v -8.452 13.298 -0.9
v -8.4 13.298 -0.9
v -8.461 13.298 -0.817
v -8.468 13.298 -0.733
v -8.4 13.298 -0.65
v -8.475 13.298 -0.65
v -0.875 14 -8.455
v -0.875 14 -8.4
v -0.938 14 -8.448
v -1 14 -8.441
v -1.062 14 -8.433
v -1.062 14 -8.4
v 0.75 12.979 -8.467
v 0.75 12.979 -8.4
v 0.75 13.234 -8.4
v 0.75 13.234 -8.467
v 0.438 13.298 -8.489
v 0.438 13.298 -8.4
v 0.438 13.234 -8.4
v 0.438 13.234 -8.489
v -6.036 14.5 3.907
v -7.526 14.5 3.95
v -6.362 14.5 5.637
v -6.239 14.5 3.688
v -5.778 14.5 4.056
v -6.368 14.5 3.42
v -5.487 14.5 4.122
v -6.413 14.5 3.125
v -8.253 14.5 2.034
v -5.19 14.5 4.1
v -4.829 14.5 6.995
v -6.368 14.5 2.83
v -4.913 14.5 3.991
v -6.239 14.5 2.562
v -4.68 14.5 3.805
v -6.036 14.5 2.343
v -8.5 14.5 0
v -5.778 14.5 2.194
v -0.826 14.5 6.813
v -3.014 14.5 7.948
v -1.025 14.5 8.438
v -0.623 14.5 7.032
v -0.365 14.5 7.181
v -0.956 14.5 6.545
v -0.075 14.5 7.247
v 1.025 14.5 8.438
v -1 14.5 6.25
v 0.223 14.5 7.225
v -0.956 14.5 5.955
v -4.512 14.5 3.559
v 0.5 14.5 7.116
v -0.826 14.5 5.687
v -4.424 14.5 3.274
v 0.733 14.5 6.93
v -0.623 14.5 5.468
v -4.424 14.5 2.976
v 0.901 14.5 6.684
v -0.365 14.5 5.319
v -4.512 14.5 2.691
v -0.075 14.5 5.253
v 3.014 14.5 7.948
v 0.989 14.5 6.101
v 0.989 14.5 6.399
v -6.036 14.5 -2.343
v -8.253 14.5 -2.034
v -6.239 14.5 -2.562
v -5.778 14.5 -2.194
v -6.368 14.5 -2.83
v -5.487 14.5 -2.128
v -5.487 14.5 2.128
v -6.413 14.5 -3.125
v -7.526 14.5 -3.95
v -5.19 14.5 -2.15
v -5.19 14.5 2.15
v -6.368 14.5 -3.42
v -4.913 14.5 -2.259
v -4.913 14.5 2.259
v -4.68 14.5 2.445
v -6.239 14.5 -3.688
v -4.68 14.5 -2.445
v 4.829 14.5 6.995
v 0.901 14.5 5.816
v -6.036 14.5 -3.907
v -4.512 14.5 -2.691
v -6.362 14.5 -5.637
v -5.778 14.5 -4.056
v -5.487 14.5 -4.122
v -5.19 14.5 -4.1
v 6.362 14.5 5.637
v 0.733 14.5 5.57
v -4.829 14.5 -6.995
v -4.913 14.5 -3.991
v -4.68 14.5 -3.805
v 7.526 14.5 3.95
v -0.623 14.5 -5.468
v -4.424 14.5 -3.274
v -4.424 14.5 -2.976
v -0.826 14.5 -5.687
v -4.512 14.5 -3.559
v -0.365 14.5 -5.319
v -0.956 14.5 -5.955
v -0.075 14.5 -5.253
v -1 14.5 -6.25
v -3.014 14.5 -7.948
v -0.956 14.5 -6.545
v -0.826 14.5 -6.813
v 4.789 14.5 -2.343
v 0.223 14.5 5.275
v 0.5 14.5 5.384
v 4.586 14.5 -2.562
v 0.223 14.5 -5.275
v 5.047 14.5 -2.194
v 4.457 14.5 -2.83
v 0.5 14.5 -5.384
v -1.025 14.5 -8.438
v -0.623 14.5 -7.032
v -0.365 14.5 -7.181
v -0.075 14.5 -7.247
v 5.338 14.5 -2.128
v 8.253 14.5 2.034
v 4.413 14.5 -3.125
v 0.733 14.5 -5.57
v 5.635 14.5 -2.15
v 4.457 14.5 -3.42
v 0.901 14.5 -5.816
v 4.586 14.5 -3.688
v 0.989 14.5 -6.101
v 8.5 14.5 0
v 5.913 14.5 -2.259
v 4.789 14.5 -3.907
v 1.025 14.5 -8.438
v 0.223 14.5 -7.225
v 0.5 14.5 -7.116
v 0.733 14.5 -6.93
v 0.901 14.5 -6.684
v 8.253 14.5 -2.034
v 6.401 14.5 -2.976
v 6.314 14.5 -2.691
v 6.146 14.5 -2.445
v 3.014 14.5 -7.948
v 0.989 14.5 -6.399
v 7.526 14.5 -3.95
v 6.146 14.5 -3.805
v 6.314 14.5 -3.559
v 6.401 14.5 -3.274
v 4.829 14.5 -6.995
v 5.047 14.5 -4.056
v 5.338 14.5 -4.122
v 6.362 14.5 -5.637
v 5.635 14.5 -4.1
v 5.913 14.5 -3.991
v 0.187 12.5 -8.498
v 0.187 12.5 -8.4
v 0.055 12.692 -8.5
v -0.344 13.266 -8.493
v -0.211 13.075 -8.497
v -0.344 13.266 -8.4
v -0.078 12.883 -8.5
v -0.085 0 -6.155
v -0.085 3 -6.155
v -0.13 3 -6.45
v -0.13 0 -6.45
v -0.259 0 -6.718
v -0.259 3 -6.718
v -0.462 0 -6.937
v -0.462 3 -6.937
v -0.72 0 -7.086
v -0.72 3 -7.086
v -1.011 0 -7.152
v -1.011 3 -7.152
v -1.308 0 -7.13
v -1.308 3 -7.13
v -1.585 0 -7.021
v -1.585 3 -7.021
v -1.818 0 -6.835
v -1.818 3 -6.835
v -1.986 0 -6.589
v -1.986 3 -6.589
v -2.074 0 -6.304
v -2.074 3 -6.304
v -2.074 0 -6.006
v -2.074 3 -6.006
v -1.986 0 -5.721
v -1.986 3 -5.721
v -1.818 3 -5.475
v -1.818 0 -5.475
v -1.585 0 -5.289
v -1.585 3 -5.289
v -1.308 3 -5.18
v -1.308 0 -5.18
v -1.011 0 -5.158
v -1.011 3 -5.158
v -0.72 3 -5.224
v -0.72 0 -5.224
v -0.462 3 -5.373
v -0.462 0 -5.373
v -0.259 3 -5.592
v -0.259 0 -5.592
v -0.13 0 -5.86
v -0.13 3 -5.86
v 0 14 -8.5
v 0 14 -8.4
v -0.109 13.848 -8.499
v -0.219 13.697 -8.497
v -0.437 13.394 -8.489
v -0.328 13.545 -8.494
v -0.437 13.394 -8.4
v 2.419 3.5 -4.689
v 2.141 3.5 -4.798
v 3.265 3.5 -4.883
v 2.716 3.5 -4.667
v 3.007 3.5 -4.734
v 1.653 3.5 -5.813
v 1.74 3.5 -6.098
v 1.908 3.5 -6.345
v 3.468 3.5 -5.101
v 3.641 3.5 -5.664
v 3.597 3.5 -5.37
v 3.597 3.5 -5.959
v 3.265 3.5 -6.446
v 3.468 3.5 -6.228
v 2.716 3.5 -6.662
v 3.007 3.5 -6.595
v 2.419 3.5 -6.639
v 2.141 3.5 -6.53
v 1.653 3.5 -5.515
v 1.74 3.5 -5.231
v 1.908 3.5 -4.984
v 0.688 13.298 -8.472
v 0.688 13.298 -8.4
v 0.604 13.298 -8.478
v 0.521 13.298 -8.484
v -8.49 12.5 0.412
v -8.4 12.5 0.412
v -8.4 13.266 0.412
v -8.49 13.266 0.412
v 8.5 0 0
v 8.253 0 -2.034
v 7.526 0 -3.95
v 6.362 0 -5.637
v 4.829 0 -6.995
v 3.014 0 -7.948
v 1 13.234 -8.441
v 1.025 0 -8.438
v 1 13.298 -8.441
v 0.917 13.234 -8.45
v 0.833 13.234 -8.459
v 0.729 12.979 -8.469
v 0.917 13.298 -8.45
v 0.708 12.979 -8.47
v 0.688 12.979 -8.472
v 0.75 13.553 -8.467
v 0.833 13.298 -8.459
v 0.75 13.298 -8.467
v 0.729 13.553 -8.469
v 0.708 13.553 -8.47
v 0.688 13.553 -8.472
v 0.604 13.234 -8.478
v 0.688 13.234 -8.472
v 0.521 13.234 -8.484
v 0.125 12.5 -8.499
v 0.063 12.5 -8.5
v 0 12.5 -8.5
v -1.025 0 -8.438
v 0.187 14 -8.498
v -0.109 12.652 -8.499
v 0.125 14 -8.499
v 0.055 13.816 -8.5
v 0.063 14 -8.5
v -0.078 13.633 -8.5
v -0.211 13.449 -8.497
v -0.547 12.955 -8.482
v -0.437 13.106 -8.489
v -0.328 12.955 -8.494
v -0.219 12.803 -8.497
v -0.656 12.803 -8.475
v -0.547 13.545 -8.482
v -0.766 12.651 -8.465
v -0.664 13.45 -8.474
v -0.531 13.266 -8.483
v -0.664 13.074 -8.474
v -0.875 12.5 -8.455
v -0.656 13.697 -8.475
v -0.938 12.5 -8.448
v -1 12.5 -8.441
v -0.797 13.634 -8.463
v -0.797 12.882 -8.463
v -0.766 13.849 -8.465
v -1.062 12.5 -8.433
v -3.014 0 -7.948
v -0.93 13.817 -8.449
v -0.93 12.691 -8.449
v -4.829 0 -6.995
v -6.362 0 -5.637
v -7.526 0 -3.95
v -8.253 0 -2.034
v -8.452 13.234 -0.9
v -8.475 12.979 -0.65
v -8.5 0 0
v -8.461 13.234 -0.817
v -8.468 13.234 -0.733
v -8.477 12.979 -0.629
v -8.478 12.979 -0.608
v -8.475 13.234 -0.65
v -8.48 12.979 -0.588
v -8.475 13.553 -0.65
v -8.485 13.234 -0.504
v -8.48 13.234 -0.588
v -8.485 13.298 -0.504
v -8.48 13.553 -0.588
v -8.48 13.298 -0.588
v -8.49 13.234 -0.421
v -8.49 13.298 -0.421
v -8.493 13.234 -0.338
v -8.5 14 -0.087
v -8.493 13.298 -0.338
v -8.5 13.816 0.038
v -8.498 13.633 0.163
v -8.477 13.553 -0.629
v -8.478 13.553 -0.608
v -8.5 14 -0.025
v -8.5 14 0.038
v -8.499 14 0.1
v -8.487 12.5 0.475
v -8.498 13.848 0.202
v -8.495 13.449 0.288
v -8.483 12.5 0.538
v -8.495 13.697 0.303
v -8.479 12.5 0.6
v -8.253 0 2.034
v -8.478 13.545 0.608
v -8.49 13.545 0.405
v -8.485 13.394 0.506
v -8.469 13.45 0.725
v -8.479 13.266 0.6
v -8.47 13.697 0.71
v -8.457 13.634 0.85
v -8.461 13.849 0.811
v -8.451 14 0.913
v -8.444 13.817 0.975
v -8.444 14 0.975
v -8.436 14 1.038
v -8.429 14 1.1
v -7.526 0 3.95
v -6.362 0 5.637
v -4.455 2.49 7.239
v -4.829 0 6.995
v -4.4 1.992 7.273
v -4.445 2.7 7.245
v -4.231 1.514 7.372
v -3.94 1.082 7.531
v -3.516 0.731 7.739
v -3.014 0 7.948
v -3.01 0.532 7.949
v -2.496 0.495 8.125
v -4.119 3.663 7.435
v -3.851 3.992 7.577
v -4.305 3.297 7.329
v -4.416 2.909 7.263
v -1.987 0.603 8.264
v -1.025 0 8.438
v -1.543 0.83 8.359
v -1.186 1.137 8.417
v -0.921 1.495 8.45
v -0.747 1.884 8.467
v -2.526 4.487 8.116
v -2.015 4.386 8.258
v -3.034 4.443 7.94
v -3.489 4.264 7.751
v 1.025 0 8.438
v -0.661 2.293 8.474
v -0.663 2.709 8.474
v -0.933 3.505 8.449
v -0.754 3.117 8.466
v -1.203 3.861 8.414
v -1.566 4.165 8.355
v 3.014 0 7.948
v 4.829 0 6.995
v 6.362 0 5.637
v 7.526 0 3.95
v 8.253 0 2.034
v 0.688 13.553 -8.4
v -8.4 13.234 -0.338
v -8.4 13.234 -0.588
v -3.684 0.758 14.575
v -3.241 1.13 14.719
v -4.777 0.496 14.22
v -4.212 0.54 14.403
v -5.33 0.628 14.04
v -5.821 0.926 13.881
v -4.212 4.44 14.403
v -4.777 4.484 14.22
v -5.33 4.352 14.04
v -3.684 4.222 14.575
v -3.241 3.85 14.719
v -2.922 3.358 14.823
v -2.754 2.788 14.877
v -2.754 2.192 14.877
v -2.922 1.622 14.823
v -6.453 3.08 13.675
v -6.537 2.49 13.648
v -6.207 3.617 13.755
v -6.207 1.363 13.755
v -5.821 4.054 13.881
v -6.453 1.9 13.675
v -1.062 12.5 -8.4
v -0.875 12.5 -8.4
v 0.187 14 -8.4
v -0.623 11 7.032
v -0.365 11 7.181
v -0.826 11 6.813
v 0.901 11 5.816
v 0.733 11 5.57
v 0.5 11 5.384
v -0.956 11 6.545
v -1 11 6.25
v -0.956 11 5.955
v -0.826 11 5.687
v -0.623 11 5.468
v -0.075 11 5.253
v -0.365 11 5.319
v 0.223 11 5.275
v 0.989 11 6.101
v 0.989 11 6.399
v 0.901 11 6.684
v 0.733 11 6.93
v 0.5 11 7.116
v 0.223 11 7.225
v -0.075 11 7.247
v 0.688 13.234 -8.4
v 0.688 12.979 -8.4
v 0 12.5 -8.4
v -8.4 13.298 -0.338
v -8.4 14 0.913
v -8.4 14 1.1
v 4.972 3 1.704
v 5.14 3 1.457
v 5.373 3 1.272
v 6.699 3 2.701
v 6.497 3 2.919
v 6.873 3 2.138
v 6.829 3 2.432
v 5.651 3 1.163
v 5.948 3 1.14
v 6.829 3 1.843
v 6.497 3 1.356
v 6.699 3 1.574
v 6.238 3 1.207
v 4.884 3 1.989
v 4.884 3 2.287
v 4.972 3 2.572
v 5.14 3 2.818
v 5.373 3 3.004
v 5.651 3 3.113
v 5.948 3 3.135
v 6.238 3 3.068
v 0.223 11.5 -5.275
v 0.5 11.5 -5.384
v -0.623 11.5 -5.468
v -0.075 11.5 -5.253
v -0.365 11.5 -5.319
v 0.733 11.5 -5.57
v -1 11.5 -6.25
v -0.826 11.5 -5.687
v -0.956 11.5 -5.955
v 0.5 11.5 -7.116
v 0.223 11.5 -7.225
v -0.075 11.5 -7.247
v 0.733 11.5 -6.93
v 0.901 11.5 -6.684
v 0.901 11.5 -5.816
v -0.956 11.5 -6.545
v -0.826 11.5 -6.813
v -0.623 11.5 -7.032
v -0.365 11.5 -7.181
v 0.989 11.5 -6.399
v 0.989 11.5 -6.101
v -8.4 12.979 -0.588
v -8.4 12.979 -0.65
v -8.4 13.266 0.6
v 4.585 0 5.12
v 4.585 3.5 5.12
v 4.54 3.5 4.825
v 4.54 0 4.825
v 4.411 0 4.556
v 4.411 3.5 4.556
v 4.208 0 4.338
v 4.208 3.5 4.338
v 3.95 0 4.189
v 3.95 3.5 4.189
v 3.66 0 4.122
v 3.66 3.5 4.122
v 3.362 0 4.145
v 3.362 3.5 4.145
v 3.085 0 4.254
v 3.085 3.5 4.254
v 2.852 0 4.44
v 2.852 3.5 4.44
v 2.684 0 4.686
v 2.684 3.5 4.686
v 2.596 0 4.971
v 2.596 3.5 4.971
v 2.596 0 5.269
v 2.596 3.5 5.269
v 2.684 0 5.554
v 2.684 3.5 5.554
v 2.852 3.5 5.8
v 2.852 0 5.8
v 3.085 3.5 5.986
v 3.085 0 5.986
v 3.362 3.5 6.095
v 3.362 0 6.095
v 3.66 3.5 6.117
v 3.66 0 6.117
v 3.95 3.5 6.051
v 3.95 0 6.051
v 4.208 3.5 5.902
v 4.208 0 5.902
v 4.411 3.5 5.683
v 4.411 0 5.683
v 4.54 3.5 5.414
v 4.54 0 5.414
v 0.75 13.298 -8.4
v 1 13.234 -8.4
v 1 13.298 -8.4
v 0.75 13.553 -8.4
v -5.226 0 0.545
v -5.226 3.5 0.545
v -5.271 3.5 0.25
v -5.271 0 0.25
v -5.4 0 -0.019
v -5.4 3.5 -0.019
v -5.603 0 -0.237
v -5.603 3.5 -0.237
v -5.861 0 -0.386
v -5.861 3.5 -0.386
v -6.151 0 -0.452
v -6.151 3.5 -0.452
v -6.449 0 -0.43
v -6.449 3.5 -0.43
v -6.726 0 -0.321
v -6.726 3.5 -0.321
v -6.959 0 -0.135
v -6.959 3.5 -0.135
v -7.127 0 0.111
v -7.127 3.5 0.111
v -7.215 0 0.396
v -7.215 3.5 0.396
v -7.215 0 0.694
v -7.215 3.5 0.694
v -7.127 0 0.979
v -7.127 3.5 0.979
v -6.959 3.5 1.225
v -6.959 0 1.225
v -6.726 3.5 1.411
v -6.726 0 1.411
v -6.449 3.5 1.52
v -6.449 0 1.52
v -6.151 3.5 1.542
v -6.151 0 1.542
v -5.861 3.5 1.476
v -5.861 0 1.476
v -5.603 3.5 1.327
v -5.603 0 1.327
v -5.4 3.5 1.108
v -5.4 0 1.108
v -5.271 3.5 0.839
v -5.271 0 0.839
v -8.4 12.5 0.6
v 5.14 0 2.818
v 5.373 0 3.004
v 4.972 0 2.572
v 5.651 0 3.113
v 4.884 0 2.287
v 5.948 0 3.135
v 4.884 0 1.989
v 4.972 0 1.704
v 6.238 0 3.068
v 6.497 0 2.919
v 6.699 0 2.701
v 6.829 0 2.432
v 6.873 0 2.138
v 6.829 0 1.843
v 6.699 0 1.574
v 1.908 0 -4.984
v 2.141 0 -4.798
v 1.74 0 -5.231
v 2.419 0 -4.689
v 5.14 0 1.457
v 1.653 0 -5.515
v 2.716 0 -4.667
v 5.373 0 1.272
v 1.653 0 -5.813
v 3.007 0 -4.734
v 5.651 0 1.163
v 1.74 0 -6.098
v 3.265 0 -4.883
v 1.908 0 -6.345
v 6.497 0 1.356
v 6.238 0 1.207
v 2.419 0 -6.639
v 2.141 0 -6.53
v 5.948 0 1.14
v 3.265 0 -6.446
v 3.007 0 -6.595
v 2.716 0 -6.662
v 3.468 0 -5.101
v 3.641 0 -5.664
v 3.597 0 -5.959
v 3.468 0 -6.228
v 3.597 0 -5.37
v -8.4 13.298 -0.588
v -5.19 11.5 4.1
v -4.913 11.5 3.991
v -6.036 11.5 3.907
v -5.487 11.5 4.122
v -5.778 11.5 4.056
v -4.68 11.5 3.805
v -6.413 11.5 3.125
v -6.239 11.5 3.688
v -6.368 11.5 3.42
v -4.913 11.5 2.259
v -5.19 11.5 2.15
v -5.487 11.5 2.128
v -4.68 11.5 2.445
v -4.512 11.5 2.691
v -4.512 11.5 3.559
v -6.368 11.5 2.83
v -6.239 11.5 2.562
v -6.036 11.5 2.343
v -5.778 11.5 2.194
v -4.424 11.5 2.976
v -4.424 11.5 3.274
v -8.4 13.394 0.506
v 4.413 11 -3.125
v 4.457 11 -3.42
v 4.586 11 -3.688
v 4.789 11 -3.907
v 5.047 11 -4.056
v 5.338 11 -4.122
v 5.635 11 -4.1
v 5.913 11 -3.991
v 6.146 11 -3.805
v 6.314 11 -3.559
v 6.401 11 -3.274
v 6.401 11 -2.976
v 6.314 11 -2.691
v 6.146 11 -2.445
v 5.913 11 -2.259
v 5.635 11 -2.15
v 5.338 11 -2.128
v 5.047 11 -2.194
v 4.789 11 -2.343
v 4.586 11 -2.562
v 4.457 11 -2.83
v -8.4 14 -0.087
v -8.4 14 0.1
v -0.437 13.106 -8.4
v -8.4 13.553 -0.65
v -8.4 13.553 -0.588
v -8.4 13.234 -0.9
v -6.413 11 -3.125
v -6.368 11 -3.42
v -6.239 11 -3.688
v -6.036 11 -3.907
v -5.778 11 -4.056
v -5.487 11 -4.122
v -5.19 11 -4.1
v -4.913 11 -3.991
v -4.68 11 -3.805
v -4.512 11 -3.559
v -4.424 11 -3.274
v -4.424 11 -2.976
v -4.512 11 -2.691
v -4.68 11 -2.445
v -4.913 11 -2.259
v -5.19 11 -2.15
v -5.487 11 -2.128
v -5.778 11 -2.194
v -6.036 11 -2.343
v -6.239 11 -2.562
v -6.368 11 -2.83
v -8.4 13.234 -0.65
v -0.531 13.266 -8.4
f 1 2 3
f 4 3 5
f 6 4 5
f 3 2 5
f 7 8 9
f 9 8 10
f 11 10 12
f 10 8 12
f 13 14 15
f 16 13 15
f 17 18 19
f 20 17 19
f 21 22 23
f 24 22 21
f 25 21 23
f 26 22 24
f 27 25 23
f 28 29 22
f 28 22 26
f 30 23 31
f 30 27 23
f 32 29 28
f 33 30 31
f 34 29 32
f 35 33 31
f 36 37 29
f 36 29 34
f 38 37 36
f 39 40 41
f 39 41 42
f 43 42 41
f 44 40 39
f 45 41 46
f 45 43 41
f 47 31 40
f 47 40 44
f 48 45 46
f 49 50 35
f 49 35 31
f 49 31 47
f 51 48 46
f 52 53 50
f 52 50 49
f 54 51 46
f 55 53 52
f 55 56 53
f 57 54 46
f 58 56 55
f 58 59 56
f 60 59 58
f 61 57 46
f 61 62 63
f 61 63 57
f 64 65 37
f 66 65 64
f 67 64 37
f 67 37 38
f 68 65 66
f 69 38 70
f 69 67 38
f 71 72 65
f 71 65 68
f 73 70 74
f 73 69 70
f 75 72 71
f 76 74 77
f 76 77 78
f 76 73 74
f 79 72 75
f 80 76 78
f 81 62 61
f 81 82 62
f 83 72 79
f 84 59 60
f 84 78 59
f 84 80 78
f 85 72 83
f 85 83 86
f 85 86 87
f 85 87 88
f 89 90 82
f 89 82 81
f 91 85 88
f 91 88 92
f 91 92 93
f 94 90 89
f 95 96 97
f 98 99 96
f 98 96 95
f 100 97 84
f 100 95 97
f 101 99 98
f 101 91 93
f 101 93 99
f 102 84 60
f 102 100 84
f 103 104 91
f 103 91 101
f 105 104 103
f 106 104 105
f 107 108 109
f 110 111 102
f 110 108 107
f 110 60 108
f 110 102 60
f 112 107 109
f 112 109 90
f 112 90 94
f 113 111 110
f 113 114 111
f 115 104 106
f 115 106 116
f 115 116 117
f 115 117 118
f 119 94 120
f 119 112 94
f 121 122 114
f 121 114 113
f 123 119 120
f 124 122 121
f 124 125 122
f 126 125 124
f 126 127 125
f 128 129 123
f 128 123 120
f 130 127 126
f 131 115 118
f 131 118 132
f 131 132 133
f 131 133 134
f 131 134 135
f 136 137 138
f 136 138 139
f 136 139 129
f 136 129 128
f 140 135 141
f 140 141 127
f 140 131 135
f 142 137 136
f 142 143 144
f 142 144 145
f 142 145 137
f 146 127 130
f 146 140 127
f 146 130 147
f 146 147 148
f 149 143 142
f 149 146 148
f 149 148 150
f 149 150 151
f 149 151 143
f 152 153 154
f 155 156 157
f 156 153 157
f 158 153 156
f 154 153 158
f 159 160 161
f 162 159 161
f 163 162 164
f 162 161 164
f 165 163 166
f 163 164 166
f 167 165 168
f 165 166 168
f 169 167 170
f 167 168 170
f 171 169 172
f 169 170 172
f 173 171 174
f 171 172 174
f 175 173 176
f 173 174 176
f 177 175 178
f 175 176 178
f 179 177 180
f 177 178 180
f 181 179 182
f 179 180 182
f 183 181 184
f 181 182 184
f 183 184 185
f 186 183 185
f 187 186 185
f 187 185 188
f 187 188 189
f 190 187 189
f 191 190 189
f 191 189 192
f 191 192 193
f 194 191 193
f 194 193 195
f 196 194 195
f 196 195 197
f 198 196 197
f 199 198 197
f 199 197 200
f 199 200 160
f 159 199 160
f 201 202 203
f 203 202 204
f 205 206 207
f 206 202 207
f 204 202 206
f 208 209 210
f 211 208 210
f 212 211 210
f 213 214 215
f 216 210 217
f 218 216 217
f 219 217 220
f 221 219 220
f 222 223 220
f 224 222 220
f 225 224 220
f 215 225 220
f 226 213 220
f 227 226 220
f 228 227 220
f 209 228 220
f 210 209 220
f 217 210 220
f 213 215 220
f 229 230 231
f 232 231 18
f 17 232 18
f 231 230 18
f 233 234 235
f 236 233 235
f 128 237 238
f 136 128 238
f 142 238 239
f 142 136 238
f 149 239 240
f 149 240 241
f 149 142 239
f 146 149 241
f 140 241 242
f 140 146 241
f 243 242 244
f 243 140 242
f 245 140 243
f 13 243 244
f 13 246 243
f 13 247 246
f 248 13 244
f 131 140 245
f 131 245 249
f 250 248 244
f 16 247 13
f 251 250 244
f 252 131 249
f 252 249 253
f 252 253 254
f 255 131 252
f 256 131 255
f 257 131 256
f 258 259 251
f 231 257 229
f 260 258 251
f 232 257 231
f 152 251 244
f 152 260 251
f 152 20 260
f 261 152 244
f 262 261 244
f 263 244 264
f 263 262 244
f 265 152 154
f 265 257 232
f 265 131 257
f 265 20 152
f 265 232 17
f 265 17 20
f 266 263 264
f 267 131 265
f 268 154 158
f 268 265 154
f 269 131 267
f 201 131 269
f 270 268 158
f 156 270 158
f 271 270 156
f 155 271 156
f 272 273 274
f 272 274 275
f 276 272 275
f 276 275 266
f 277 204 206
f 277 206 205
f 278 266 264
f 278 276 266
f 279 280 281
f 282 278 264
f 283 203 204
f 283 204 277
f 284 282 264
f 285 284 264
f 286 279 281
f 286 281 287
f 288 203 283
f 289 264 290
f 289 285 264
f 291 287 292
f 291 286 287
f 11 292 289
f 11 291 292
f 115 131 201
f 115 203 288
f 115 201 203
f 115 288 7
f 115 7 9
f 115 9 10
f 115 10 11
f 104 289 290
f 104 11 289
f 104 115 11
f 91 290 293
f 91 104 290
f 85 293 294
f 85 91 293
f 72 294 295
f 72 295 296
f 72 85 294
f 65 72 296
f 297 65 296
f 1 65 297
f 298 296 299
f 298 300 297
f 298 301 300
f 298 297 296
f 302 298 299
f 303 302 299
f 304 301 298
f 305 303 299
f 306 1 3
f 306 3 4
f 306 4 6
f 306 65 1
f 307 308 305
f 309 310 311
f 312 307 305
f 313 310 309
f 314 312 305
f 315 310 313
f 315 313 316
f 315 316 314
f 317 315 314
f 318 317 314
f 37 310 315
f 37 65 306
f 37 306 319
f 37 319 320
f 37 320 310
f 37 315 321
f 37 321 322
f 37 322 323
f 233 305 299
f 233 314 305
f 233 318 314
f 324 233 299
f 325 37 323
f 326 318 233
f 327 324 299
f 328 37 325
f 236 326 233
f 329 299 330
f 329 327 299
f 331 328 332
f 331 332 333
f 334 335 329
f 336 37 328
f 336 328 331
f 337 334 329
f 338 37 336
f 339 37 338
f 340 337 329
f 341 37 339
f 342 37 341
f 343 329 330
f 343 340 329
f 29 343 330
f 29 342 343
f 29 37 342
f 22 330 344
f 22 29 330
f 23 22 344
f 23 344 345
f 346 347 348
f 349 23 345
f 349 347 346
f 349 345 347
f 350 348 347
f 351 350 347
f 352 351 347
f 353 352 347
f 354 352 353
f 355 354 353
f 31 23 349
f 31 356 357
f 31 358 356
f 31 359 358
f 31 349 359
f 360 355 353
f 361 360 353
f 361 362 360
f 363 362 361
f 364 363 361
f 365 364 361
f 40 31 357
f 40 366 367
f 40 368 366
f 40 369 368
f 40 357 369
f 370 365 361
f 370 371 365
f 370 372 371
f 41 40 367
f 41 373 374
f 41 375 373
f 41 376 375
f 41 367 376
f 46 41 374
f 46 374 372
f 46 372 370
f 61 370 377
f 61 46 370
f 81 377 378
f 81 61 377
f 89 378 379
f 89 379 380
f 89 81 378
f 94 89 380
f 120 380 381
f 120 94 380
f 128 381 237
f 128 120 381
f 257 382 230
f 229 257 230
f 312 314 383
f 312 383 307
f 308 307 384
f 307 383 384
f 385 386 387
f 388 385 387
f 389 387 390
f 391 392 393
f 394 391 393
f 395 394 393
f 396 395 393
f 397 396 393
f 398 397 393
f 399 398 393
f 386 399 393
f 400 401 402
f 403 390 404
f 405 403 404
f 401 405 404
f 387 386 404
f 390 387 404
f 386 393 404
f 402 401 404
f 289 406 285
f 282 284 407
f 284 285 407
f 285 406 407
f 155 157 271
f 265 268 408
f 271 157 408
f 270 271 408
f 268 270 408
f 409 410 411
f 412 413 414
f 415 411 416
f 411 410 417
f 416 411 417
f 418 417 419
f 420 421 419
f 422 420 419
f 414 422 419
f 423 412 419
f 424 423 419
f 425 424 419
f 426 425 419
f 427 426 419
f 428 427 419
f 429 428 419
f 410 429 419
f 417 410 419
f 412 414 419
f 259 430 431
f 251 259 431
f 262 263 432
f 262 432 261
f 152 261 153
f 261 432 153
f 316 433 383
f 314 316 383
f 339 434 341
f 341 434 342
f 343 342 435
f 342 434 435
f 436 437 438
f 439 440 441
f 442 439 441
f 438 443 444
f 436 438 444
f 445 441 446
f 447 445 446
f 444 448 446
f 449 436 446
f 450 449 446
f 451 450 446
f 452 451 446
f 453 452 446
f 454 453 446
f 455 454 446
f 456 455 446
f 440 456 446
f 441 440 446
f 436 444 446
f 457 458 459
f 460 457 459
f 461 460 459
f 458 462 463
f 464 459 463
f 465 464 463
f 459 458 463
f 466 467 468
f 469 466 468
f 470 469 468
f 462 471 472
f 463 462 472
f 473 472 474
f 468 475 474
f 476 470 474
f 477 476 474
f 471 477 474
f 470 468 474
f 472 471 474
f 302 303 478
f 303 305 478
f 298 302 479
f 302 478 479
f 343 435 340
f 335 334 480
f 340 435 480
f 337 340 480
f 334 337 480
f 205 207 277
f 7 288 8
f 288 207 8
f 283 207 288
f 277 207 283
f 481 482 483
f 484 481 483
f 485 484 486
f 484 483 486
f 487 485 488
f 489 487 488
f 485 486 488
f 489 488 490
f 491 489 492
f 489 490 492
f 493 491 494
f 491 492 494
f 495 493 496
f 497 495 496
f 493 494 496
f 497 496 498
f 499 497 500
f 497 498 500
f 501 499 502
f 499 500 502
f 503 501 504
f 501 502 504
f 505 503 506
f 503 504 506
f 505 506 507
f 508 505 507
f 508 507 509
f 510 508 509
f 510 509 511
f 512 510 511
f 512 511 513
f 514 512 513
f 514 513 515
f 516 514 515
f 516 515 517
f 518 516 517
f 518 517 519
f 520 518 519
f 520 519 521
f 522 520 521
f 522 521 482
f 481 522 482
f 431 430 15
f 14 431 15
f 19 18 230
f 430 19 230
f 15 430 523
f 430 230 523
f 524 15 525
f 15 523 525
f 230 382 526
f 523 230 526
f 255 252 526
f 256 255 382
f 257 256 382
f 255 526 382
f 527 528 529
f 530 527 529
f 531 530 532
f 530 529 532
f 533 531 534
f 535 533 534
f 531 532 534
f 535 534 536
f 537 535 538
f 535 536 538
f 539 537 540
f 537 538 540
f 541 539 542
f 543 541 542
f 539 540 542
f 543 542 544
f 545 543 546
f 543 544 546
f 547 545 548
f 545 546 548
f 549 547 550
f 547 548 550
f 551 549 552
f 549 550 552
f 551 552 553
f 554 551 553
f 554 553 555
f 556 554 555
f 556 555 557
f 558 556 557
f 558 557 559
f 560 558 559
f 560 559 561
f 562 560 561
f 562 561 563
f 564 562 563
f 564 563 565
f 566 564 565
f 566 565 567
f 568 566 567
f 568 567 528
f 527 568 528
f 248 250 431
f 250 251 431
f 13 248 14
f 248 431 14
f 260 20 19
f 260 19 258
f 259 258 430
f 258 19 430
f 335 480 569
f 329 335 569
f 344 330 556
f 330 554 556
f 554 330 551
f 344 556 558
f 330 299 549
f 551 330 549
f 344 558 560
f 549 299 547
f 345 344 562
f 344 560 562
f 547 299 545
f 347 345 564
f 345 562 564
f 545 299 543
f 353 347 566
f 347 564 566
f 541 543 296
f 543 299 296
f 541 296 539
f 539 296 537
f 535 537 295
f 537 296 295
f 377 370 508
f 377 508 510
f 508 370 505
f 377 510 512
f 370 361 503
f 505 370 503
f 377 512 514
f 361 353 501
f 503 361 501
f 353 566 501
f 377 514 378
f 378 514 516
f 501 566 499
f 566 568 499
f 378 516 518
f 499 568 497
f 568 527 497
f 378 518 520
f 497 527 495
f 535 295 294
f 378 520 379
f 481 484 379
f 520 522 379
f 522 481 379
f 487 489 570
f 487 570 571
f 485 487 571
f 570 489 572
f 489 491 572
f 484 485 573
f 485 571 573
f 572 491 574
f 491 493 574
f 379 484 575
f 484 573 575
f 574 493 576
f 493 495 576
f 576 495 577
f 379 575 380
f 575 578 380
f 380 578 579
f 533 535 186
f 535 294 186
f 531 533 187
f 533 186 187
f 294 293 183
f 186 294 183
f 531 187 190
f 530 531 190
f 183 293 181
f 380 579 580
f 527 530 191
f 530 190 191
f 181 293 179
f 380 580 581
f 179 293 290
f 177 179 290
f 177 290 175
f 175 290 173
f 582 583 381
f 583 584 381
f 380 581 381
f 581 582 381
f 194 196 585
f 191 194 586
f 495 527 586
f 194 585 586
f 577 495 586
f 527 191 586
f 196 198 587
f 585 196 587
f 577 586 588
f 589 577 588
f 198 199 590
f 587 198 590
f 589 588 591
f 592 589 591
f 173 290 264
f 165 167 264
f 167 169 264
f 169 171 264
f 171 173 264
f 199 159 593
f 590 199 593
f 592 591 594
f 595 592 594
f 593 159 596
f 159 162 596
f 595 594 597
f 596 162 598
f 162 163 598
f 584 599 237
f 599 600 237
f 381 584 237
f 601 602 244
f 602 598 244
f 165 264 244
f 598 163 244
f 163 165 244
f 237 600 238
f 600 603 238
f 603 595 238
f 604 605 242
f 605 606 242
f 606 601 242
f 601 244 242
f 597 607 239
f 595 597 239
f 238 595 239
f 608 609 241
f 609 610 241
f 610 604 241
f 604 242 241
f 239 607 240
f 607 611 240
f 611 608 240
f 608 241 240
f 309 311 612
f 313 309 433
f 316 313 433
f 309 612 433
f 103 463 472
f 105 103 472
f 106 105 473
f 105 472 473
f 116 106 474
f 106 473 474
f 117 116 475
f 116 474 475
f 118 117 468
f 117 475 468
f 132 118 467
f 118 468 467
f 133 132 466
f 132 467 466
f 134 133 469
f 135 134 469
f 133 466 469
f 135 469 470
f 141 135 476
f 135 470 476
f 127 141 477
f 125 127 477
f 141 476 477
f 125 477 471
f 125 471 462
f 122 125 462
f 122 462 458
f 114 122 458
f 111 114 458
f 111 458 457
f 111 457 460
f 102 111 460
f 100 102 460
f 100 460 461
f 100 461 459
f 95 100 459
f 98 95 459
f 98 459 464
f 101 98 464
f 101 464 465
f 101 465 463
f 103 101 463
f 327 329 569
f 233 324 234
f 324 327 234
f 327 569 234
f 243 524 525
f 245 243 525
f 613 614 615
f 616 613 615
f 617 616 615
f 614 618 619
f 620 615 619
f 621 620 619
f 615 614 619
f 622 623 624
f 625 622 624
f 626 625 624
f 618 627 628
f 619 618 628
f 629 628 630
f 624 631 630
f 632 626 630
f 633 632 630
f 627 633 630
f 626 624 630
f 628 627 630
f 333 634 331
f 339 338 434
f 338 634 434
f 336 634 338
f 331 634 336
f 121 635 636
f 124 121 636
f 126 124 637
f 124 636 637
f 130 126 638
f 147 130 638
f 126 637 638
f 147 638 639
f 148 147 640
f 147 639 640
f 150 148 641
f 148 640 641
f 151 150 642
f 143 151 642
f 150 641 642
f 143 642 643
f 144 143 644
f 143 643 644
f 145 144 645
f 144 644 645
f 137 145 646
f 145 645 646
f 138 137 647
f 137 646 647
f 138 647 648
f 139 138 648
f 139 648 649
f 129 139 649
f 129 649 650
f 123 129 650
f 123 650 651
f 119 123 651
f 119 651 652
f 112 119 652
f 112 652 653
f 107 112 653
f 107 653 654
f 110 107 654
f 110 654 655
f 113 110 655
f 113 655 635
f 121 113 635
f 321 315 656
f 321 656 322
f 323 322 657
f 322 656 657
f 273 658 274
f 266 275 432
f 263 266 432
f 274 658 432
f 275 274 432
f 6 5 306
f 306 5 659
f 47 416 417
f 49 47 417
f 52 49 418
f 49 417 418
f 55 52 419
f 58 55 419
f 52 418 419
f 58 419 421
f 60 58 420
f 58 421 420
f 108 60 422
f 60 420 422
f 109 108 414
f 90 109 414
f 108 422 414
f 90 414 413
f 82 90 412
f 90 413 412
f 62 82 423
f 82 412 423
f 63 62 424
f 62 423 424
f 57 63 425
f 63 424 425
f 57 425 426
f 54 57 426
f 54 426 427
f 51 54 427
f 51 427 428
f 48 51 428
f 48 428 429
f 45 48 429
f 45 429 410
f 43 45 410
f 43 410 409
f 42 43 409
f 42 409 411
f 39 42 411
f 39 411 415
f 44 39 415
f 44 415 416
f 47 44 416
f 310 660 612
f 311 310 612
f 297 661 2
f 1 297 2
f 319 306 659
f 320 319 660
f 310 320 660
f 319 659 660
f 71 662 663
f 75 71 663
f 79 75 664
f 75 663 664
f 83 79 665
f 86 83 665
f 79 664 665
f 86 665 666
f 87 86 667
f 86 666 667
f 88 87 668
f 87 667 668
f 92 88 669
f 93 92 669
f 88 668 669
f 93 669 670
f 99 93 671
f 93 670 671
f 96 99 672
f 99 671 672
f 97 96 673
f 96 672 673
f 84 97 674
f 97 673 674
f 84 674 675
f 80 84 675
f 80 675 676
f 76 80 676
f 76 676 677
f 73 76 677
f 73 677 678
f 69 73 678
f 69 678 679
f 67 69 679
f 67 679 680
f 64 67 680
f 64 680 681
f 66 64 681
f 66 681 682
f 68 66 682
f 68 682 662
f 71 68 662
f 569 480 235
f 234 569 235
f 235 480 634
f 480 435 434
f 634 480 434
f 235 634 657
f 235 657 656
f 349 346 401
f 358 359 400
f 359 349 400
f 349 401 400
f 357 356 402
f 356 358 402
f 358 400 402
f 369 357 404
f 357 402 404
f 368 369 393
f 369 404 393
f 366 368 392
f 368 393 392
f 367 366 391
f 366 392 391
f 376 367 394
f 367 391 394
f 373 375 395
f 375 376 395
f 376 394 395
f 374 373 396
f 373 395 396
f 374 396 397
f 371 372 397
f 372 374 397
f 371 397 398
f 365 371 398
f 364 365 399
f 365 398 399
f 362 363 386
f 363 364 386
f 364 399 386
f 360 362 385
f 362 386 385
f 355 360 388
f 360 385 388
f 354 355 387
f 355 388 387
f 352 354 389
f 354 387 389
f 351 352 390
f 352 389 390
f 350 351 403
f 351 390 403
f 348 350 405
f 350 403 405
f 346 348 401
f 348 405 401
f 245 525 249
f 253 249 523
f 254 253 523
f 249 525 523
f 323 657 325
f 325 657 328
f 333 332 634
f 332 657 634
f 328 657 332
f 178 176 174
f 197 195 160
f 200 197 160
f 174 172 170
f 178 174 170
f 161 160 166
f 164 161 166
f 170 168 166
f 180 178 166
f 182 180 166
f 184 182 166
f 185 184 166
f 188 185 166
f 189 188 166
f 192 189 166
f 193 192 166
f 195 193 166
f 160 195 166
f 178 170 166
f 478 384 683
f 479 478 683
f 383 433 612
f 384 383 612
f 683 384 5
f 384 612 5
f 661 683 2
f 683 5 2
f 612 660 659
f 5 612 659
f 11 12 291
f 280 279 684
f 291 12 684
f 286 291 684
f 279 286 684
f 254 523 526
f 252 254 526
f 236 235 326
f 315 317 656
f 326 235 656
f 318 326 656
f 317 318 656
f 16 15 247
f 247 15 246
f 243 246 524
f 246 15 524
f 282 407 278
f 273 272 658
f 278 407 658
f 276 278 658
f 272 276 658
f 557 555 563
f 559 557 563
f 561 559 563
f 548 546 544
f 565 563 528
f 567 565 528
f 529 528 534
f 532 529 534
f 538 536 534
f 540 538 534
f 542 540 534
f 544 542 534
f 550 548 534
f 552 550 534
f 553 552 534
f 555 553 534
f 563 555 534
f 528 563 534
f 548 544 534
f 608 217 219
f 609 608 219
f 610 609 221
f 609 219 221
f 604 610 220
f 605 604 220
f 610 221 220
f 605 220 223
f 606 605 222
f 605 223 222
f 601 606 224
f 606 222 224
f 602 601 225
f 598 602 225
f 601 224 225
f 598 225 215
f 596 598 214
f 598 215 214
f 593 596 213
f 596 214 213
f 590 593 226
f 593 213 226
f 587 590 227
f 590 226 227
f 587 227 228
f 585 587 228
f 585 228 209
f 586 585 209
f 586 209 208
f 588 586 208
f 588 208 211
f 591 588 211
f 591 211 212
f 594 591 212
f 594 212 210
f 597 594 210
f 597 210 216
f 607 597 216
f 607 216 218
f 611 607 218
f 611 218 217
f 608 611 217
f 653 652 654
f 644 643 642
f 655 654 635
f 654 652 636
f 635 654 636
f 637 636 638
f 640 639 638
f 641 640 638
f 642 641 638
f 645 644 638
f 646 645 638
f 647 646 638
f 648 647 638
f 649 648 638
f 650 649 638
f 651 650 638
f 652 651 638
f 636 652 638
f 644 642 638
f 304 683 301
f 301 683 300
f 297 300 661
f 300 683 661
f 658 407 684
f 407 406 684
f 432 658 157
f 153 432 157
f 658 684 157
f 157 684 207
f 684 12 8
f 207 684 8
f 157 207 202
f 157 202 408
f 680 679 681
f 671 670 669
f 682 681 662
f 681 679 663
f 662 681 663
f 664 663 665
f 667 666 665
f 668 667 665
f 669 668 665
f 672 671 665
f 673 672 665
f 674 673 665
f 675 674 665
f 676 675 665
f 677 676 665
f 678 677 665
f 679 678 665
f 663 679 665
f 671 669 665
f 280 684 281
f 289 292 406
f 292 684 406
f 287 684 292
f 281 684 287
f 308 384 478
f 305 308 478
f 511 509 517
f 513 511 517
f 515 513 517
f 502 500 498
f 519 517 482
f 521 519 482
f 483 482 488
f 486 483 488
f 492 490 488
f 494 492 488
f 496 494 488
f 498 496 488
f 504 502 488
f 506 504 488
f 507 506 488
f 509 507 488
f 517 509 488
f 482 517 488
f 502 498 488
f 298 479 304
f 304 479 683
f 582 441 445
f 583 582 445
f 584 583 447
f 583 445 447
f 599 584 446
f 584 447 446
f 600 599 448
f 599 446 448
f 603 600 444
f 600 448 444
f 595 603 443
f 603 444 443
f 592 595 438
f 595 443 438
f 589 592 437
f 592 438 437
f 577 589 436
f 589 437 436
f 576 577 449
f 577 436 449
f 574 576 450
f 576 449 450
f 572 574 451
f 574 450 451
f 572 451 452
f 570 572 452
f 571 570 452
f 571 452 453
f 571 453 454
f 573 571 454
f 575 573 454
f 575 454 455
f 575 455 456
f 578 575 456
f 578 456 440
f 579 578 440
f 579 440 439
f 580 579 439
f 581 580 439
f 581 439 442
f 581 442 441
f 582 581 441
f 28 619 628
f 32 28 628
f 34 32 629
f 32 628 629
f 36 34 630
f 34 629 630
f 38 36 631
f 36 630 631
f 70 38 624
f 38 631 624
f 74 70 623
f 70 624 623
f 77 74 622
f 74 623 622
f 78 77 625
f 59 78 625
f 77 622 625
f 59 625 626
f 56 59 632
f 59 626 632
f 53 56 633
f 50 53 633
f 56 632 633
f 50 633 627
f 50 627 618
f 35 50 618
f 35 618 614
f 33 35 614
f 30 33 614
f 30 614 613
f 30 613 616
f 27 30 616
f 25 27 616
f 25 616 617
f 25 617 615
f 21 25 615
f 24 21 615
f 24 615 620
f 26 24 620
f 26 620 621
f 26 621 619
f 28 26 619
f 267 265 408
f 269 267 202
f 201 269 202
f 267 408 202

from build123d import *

# Parameters (mm, degrees)
SKETCH1_W                    = 8.5
SKETCH1_H                    = 14.5
CUT_EXTRUDE1_REACH           = 2.1
CUT_EXTRUDE2_REACH           = 2.1
CUT_EXTRUDE3_REACH           = 2.1
CUT_EXTRUDE4_REACH           = 2.1
F_2_0_2_DIAMETER_HOLE1_D     = 2
F_2_0_2_DIAMETER_HOLE1_DEPTH = 3
F_2_0_2_DIAMETER_HOLE2_D     = 2
F_2_0_2_DIAMETER_HOLE2_DEPTH = 3.5
F_2_0_2_DIAMETER_HOLE3_D     = 2
F_2_0_2_DIAMETER_HOLE3_DEPTH = 3
F_2_0_2_DIAMETER_HOLE4_D     = 2
F_2_0_2_DIAMETER_HOLE4_DEPTH = 3.5


with BuildPart() as part:
    # Sketch1 → Revolve1 (revolve)
    with BuildSketch(Plane(origin=(0, 0, 0), x_dir=(-1, 0, 0), z_dir=(0, 0, -1))):
        with Locations((-4.25, 7.25)):
            Rectangle(SKETCH1_W, SKETCH1_H)
    revolve(axis=Axis((0, 0, 0), (0, 1, 0)))

    # Sketch2 → Cut-Extrude1 (cut, up to next)
    with BuildSketch(Plane(origin=(-8.4, 0, 0), x_dir=(0, 0, -1), z_dir=(1, 0, 0)), mode=Mode.PRIVATE) as cut_extrude1_sk1:
        Polygon((0.9, 13.234042555), (0.9, 13.297872335), (0.649999993, 13.297872335), (0.649999993, 13.553191453), (0.587500007, 13.553191453), (0.587500007, 13.297872335), (0.3375, 13.297872335), (0.3375, 13.234042555), (0.587500007, 13.234042555), (0.587500007, 12.978723392), (0.649999993, 12.978723392), (0.649999993, 13.234042555), align=None)
    cut_extrude1_tool1 = extrude(cut_extrude1_sk1.sketch, amount=-CUT_EXTRUDE1_REACH, mode=Mode.PRIVATE) & part.part
    add(cut_extrude1_tool1.solids().sort_by_distance((-8.4, 13.265957, -0.61875))[0], mode=Mode.SUBTRACT)

    # Sketch3 → Cut-Extrude2 (cut, up to next)
    with BuildSketch(Plane.XY.offset(-8.4), mode=Mode.PRIVATE) as cut_extrude2_sk1:
        Polygon((1, 13.234042555), (1, 13.297872335), (0.749999993, 13.297872335), (0.749999993, 13.553191453), (0.687500007, 13.553191453), (0.687500007, 13.297872335), (0.4375, 13.297872335), (0.4375, 13.234042555), (0.687500007, 13.234042555), (0.687500007, 12.978723392), (0.749999993, 12.978723392), (0.749999993, 13.234042555), align=None)
    cut_extrude2_tool1 = extrude(cut_extrude2_sk1.sketch, amount=-CUT_EXTRUDE2_REACH, mode=Mode.PRIVATE) & part.part
    add(cut_extrude2_tool1.solids().sort_by_distance((0.71875, 13.265957, -8.4))[0], mode=Mode.SUBTRACT)

    # Sketch4 → Cut-Extrude3 (cut, up to next)
    with BuildSketch(Plane.XY.offset(-8.4), mode=Mode.PRIVATE) as cut_extrude3_sk1:
        Polygon((-0.875, 12.5), (-0.43749997, 13.106382996), (-3e-08, 12.5), (0.18749997, 12.5), (-0.34374997, 13.265957445), (0.18749997, 14), (-3e-08, 14), (-0.43749997, 13.393617004), (-0.875, 14), (-1.0625, 14), (-0.53125006, 13.265957445), (-1.0625, 12.5), align=None)
    cut_extrude3_tool1 = extrude(cut_extrude3_sk1.sketch, amount=-CUT_EXTRUDE3_REACH, mode=Mode.PRIVATE) & part.part
    add(cut_extrude3_tool1.solids().sort_by_distance((-0.4375, 13.242259, -8.4))[0], mode=Mode.SUBTRACT)

    # Sketch5 → Cut-Extrude4 (cut, up to next)
    with BuildSketch(Plane(origin=(-8.4, 0, 0), x_dir=(0, 0, -1), z_dir=(1, 0, 0)), mode=Mode.PRIVATE) as cut_extrude4_sk1:
        Polygon((-1.10000006, 14), (-0.6, 13.265957445), (-0.6, 12.5), (-0.4125, 12.5), (-0.4125, 13.265957445), (0.08749997, 14), (-0.10000003, 14), (-0.50625, 13.393617004), (-0.91250006, 14), align=None)
    cut_extrude4_tool1 = extrude(cut_extrude4_sk1.sketch, amount=-CUT_EXTRUDE4_REACH, mode=Mode.PRIVATE) & part.part
    add(cut_extrude4_tool1.solids().sort_by_distance((-8.4, 13.37564, 0.50625))[0], mode=Mode.SUBTRACT)

    # Sketch6 → Revolve2 (revolve)
    with BuildSketch(Plane(origin=(0, 2.49, 0), x_dir=(1, 0, 0), z_dir=(0, 1, 0))):
        Polygon((-6.537367948, -13.647813756), (-4.635254916, -14.265847744), (-2.552899345, -7.857016287), (-4.455012378, -7.238982298), align=None)
    revolve(axis=Axis((-4.635254916, 2.49, 14.265847744), (0.309016994, 0, -0.951056516)))

    # Ø2.0 (2) Diameter Hole1
    with Locations(Plane(origin=(0, 0, 0), x_dir=(-1, 0, 0), z_dir=(0, -1, 0))):
        with Locations((1.08530111, 6.155048456), (-5.87307888, -2.137625896)):
            Hole(F_2_0_2_DIAMETER_HOLE1_D / 2, depth=F_2_0_2_DIAMETER_HOLE1_DEPTH)

    # Ø2.0 (2) Diameter Hole2
    with Locations(Plane(origin=(0, 0, 0), x_dir=(-1, 0, 0), z_dir=(0, -1, 0))):
        with Locations((6.226216863, -0.544723392), (-3.584852727, -5.119700277), (-2.641364136, 5.664423669)):
            Hole(F_2_0_2_DIAMETER_HOLE2_D / 2, depth=F_2_0_2_DIAMETER_HOLE2_DEPTH)

    # Ø2.0 (2) Diameter Hole3
    with Locations(Plane(origin=(0, 14.5, 0), x_dir=(1, 0, 0), z_dir=(0, 1, 0))):
        with Locations((0, 6.25), (-5.412658774, -3.125)):
            Hole(F_2_0_2_DIAMETER_HOLE3_D / 2, depth=F_2_0_2_DIAMETER_HOLE3_DEPTH)

    # Ø2.0 (2) Diameter Hole4
    with Locations(Plane(origin=(0, 14.5, 0), x_dir=(1, 0, 0), z_dir=(0, 1, 0))):
        with Locations((0, -6.25), (5.412658774, 3.125), (-5.412658774, 3.125)):
            Hole(F_2_0_2_DIAMETER_HOLE4_D / 2, depth=F_2_0_2_DIAMETER_HOLE4_DEPTH)


solid = part.part
